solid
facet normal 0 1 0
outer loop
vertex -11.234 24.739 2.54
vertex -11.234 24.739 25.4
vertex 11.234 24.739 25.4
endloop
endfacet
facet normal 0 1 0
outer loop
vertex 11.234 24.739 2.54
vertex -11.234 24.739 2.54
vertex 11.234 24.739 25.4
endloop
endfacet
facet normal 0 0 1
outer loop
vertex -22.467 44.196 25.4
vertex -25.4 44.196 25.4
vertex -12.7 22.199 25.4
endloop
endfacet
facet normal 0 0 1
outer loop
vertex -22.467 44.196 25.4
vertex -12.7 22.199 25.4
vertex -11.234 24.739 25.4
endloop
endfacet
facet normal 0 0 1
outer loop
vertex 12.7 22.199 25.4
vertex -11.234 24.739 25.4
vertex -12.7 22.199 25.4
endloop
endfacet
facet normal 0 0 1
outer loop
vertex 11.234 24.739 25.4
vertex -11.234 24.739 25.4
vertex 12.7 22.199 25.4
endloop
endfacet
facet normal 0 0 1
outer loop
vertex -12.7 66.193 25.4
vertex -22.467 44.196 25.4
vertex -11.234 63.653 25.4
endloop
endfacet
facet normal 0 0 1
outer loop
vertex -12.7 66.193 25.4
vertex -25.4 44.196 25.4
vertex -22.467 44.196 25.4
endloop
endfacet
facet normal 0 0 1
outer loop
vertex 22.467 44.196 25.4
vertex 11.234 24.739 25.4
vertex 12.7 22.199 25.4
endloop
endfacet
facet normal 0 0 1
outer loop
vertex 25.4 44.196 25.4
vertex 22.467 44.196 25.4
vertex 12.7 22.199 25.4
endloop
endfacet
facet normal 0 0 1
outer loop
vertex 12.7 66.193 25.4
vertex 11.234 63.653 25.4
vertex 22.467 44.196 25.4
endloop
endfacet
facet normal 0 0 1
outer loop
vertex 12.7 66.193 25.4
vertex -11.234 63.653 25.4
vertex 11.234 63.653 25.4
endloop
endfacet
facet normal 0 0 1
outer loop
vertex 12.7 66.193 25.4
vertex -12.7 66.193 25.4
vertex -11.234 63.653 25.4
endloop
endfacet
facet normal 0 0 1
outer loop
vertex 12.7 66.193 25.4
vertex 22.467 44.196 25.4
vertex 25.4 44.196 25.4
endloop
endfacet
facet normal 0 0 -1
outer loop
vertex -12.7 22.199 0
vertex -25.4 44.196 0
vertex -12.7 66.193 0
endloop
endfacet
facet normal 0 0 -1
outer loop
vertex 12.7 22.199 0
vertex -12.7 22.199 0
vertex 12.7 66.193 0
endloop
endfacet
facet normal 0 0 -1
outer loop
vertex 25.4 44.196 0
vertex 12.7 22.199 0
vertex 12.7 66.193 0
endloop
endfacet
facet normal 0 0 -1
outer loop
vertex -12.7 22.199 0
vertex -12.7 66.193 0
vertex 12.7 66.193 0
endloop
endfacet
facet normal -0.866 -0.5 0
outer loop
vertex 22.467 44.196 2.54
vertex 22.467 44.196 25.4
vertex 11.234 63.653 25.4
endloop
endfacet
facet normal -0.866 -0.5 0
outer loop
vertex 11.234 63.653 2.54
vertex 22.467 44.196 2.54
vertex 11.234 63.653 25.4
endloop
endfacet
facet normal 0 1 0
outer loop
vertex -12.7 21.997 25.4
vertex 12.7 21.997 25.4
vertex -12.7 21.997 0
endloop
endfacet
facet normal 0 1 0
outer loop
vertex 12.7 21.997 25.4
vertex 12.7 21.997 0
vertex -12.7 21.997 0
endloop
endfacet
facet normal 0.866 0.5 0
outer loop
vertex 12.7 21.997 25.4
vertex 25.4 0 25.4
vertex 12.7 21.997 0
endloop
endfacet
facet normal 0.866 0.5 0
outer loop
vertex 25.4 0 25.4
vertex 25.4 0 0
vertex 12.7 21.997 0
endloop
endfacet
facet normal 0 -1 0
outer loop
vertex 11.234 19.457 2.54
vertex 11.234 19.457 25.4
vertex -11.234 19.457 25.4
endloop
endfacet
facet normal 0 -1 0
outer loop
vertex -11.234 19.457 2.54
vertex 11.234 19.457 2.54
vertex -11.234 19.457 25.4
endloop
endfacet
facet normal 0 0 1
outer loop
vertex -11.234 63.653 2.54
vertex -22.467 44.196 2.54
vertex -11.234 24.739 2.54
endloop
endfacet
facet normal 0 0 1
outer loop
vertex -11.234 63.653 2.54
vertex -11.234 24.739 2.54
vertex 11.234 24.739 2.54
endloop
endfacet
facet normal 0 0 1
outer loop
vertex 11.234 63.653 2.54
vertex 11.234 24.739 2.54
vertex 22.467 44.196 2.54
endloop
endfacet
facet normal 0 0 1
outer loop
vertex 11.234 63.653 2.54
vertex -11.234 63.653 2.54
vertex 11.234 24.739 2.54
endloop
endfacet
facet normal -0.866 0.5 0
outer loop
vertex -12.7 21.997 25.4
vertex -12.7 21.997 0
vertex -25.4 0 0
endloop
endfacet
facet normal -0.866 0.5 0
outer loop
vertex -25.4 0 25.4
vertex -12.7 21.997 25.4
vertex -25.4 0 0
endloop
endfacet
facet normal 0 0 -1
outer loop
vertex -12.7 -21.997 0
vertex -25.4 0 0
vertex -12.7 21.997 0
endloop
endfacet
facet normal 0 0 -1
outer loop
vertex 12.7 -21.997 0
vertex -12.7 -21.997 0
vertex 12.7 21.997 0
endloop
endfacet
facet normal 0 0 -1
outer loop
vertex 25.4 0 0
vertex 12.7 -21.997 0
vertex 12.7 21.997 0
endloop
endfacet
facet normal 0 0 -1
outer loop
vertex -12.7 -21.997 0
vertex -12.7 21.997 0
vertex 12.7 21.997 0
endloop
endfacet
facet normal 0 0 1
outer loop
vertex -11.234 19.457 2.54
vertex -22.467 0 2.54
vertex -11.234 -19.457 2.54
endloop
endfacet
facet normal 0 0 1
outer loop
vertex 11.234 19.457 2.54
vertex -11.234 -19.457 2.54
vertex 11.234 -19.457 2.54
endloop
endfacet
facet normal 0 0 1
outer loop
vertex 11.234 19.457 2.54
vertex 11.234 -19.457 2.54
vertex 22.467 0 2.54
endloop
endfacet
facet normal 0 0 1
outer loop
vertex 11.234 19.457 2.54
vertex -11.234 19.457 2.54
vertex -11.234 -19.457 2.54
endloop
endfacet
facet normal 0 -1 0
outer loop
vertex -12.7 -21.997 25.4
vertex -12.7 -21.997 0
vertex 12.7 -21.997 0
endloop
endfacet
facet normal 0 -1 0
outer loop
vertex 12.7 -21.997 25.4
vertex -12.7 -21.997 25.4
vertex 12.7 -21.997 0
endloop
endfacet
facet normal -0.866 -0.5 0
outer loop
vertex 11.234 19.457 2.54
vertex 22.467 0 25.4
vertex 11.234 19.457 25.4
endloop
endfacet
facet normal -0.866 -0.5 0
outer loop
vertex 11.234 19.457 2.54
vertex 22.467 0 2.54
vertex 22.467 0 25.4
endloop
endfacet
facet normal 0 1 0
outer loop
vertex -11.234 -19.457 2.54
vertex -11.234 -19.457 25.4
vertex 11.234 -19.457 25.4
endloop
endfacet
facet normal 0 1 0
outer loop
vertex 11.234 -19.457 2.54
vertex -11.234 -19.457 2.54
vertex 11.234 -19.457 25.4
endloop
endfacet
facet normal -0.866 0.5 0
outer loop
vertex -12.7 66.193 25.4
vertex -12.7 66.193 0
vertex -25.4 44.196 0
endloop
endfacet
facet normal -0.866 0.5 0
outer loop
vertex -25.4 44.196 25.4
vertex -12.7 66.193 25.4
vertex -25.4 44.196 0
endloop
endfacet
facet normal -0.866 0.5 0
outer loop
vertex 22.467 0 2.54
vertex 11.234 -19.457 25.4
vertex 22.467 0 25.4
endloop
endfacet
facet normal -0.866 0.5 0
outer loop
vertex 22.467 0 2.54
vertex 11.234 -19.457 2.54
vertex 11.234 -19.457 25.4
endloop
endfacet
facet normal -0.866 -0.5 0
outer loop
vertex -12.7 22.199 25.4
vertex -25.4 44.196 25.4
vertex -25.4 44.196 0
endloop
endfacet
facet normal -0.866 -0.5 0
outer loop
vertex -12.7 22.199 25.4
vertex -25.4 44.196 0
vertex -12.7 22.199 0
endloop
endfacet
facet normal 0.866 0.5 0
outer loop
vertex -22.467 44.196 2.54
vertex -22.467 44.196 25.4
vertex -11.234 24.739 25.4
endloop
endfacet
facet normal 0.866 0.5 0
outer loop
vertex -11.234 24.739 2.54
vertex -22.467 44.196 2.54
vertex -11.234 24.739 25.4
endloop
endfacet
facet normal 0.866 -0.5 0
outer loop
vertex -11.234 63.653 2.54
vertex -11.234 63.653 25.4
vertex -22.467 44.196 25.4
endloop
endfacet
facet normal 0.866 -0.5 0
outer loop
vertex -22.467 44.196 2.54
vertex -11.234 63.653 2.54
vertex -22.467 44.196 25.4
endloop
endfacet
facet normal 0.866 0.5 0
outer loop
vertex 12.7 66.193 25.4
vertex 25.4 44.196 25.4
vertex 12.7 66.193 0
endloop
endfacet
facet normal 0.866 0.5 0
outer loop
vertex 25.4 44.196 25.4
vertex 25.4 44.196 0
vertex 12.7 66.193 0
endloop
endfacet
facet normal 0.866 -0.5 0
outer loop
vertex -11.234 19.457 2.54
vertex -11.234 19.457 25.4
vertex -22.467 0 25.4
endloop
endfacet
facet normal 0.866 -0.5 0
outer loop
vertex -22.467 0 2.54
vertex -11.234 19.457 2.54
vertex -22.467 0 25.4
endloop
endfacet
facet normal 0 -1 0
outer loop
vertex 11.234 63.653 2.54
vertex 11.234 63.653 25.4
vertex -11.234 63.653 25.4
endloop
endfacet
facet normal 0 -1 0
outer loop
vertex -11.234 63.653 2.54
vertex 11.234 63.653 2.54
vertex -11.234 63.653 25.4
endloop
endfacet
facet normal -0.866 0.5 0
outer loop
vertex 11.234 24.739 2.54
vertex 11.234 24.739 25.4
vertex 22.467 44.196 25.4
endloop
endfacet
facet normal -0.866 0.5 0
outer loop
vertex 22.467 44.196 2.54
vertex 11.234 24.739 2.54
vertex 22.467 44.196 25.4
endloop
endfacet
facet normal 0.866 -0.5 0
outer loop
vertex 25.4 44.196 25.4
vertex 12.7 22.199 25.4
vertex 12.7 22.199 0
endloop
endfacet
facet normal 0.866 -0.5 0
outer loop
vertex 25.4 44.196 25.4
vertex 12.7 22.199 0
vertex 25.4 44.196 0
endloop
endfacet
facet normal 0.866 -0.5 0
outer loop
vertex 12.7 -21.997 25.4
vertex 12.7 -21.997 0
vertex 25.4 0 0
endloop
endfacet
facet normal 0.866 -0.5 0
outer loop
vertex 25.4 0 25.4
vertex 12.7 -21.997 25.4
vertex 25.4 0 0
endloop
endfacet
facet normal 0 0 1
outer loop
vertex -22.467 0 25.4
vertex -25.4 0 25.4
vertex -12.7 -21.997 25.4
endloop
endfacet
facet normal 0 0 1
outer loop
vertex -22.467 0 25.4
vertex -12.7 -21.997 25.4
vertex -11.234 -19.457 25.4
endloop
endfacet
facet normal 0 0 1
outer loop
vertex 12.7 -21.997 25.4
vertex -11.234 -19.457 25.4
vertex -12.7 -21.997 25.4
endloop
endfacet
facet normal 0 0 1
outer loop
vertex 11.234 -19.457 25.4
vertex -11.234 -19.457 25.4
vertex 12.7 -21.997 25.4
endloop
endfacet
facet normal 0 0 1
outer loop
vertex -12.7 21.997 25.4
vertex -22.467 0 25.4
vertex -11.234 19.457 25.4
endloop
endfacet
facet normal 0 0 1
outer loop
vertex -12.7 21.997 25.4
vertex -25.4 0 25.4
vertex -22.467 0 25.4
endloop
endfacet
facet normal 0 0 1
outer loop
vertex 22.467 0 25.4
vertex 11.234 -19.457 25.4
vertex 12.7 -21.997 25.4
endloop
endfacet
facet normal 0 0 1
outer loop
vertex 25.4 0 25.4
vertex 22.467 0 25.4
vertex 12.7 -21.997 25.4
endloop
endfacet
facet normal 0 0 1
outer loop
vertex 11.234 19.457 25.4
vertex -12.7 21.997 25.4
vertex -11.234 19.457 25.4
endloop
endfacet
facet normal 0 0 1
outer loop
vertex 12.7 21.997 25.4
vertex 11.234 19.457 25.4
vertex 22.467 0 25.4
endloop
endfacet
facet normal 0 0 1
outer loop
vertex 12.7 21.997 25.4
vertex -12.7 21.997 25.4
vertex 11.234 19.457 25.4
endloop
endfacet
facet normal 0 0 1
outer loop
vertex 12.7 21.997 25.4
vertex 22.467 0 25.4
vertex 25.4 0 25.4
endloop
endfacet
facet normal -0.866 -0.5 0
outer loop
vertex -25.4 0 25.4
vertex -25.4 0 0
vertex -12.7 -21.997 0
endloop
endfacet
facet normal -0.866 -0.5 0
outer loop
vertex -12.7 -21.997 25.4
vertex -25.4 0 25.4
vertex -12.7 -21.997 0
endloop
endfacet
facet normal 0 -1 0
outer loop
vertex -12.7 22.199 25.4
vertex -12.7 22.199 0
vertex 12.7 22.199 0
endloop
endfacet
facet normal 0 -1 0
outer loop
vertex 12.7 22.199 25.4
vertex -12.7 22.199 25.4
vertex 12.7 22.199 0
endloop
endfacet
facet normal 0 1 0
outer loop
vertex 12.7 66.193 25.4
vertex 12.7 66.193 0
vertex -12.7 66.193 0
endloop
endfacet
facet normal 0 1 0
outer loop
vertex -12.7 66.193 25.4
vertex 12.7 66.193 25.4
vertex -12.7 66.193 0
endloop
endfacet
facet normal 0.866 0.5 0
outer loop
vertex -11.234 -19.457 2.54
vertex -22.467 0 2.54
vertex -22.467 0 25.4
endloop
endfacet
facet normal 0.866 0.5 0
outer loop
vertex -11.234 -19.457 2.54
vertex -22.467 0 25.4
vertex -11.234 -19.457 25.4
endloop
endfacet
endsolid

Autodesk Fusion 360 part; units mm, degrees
sketch "base" plane through (0, 0, 0) normal (0, 0, 1) x (1, 0, 0)
  line L0 (-12.7, 21.997) -> (-25.4, 0)
  line L1 (-25.4, 0) -> (-12.7, -21.997)
  line L2 (-12.7, -21.997) -> (12.7, -21.997)
  line L3 (12.7, -21.997) -> (25.4, 0)
  line L4 (25.4, 0) -> (12.7, 21.997)
  line L5 (12.7, 21.997) -> (-12.7, 21.997)
  line L6 (25.4, 44.196) -> (12.7, 66.193)
  line L7 (12.7, 66.193) -> (-12.7, 66.193)
  line L8 (12.7, 22.199) -> (25.4, 44.196)
  line L9 (-12.7, 22.199) -> (12.7, 22.199)
  line L10 (-12.7, 66.193) -> (-25.4, 44.196)
  line L11 (-25.4, 44.196) -> (-12.7, 22.199)
  point P0 (0, 44.196)
  dimension "d1" = 25.4
  dimension "d2" = 25.4
  dimension "d3" = 44.196
extrude "Extrude1" add sketch "base" along normal blind 25.4 makes body 1 at (-4.2333, -7.3323, 0) makes body 2 at (-8.4667, 44.196, 0)
shell "Shell1" thickness 2.54 removed faces 1 at (-4.2333, -7.3323, 25.4) on bodies 1
shell "Shell2" thickness 2.54 removed faces 1 at (-8.4667, 44.196, 25.4) on bodies 2
